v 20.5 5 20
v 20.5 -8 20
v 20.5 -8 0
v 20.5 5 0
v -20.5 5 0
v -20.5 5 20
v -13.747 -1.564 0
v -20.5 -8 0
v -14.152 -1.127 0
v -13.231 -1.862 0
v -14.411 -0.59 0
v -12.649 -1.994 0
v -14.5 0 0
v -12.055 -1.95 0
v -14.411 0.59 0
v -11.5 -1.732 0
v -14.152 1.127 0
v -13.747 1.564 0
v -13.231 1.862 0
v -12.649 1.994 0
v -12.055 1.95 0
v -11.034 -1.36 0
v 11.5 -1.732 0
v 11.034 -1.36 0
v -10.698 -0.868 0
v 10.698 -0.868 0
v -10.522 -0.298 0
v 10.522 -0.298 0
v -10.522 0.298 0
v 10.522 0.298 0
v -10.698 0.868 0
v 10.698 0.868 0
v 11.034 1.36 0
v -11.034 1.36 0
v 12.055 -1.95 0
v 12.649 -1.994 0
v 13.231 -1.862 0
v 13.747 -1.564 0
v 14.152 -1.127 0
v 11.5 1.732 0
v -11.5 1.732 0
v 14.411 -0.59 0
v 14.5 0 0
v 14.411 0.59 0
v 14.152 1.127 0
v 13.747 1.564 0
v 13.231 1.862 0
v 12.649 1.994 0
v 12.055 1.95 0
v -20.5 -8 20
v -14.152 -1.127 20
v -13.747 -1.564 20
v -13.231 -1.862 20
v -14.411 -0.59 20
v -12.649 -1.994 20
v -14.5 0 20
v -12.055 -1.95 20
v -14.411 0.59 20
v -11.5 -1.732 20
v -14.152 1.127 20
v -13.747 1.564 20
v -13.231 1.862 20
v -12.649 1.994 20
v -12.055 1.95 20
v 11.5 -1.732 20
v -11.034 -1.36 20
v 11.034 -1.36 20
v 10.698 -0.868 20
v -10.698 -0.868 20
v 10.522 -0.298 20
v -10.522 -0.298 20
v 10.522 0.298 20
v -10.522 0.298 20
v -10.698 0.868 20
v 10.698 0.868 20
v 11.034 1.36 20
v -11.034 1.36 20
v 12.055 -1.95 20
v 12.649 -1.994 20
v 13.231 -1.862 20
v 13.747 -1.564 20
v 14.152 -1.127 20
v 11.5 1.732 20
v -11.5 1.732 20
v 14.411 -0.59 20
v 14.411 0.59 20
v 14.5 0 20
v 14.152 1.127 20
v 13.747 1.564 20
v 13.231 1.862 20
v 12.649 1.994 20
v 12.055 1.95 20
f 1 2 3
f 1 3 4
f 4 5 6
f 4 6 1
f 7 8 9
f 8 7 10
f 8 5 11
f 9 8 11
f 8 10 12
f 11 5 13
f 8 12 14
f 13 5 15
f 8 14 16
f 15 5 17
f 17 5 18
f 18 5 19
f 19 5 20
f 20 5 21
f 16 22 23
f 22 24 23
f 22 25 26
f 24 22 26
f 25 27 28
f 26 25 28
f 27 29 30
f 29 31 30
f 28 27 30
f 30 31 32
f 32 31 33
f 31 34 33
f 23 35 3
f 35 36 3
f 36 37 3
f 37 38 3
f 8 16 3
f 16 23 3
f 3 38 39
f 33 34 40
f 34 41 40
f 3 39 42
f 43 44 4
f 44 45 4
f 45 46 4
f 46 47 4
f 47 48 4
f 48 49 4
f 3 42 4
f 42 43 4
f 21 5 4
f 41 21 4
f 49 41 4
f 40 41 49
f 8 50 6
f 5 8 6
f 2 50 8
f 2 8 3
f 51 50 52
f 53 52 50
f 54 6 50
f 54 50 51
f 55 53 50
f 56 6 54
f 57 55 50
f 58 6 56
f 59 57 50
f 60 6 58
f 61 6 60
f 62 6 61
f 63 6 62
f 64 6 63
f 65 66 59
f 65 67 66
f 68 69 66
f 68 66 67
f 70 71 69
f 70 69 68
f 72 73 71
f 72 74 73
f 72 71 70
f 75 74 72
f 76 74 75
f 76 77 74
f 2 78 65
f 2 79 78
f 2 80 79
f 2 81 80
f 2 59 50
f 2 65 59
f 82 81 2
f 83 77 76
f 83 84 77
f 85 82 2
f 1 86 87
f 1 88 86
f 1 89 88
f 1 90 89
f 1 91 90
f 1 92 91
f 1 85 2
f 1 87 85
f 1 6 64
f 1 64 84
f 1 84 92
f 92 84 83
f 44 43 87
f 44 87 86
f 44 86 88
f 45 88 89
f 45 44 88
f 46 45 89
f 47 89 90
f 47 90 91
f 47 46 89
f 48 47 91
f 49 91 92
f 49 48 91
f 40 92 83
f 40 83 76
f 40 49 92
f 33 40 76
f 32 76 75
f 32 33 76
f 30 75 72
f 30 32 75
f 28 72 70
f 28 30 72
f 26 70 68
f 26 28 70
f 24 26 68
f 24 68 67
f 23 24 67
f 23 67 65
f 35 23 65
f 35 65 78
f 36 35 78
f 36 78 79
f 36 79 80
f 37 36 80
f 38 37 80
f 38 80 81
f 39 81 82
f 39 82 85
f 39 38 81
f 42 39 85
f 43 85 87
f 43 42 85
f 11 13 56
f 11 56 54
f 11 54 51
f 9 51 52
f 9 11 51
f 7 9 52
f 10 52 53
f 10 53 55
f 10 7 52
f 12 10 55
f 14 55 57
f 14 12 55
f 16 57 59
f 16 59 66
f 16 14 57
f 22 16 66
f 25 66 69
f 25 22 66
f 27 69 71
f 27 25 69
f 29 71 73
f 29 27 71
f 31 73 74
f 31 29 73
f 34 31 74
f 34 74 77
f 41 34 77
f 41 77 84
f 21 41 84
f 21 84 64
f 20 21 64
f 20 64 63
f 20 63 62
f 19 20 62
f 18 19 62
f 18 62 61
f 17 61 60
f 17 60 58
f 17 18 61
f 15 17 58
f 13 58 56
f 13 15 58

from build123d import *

# Parameters (mm, degrees)
SKETCH_1_W      = 41
SKETCH_1_H      = 10
SKETCH_1_R      = 2
EXTRUDE_1_DEPTH = 20
SKETCH_2_W      = 41
SKETCH_2_H      = 3
EXTRUDE_2_DEPTH = 20


with BuildPart() as part:
    # 草图1 → 凸台-拉伸1 (new body)
    with BuildSketch(Plane.XY):
        Rectangle(SKETCH_1_W, SKETCH_1_H)
        with Locations((12.5, 0)):
            Circle(SKETCH_1_R, mode=Mode.SUBTRACT)
        with Locations(Location((-12.5, 0, 0), (0, 0, 180))):
            Circle(SKETCH_1_R, mode=Mode.SUBTRACT)
    extrude(amount=EXTRUDE_1_DEPTH)

    # 草图2 → 凸台-拉伸2 (add)
    with BuildSketch(Plane.XY.offset(20)):
        with Locations((0, -6.5)):
            Rectangle(SKETCH_2_W, SKETCH_2_H)
    extrude(amount=-EXTRUDE_2_DEPTH)


solid = part.part
